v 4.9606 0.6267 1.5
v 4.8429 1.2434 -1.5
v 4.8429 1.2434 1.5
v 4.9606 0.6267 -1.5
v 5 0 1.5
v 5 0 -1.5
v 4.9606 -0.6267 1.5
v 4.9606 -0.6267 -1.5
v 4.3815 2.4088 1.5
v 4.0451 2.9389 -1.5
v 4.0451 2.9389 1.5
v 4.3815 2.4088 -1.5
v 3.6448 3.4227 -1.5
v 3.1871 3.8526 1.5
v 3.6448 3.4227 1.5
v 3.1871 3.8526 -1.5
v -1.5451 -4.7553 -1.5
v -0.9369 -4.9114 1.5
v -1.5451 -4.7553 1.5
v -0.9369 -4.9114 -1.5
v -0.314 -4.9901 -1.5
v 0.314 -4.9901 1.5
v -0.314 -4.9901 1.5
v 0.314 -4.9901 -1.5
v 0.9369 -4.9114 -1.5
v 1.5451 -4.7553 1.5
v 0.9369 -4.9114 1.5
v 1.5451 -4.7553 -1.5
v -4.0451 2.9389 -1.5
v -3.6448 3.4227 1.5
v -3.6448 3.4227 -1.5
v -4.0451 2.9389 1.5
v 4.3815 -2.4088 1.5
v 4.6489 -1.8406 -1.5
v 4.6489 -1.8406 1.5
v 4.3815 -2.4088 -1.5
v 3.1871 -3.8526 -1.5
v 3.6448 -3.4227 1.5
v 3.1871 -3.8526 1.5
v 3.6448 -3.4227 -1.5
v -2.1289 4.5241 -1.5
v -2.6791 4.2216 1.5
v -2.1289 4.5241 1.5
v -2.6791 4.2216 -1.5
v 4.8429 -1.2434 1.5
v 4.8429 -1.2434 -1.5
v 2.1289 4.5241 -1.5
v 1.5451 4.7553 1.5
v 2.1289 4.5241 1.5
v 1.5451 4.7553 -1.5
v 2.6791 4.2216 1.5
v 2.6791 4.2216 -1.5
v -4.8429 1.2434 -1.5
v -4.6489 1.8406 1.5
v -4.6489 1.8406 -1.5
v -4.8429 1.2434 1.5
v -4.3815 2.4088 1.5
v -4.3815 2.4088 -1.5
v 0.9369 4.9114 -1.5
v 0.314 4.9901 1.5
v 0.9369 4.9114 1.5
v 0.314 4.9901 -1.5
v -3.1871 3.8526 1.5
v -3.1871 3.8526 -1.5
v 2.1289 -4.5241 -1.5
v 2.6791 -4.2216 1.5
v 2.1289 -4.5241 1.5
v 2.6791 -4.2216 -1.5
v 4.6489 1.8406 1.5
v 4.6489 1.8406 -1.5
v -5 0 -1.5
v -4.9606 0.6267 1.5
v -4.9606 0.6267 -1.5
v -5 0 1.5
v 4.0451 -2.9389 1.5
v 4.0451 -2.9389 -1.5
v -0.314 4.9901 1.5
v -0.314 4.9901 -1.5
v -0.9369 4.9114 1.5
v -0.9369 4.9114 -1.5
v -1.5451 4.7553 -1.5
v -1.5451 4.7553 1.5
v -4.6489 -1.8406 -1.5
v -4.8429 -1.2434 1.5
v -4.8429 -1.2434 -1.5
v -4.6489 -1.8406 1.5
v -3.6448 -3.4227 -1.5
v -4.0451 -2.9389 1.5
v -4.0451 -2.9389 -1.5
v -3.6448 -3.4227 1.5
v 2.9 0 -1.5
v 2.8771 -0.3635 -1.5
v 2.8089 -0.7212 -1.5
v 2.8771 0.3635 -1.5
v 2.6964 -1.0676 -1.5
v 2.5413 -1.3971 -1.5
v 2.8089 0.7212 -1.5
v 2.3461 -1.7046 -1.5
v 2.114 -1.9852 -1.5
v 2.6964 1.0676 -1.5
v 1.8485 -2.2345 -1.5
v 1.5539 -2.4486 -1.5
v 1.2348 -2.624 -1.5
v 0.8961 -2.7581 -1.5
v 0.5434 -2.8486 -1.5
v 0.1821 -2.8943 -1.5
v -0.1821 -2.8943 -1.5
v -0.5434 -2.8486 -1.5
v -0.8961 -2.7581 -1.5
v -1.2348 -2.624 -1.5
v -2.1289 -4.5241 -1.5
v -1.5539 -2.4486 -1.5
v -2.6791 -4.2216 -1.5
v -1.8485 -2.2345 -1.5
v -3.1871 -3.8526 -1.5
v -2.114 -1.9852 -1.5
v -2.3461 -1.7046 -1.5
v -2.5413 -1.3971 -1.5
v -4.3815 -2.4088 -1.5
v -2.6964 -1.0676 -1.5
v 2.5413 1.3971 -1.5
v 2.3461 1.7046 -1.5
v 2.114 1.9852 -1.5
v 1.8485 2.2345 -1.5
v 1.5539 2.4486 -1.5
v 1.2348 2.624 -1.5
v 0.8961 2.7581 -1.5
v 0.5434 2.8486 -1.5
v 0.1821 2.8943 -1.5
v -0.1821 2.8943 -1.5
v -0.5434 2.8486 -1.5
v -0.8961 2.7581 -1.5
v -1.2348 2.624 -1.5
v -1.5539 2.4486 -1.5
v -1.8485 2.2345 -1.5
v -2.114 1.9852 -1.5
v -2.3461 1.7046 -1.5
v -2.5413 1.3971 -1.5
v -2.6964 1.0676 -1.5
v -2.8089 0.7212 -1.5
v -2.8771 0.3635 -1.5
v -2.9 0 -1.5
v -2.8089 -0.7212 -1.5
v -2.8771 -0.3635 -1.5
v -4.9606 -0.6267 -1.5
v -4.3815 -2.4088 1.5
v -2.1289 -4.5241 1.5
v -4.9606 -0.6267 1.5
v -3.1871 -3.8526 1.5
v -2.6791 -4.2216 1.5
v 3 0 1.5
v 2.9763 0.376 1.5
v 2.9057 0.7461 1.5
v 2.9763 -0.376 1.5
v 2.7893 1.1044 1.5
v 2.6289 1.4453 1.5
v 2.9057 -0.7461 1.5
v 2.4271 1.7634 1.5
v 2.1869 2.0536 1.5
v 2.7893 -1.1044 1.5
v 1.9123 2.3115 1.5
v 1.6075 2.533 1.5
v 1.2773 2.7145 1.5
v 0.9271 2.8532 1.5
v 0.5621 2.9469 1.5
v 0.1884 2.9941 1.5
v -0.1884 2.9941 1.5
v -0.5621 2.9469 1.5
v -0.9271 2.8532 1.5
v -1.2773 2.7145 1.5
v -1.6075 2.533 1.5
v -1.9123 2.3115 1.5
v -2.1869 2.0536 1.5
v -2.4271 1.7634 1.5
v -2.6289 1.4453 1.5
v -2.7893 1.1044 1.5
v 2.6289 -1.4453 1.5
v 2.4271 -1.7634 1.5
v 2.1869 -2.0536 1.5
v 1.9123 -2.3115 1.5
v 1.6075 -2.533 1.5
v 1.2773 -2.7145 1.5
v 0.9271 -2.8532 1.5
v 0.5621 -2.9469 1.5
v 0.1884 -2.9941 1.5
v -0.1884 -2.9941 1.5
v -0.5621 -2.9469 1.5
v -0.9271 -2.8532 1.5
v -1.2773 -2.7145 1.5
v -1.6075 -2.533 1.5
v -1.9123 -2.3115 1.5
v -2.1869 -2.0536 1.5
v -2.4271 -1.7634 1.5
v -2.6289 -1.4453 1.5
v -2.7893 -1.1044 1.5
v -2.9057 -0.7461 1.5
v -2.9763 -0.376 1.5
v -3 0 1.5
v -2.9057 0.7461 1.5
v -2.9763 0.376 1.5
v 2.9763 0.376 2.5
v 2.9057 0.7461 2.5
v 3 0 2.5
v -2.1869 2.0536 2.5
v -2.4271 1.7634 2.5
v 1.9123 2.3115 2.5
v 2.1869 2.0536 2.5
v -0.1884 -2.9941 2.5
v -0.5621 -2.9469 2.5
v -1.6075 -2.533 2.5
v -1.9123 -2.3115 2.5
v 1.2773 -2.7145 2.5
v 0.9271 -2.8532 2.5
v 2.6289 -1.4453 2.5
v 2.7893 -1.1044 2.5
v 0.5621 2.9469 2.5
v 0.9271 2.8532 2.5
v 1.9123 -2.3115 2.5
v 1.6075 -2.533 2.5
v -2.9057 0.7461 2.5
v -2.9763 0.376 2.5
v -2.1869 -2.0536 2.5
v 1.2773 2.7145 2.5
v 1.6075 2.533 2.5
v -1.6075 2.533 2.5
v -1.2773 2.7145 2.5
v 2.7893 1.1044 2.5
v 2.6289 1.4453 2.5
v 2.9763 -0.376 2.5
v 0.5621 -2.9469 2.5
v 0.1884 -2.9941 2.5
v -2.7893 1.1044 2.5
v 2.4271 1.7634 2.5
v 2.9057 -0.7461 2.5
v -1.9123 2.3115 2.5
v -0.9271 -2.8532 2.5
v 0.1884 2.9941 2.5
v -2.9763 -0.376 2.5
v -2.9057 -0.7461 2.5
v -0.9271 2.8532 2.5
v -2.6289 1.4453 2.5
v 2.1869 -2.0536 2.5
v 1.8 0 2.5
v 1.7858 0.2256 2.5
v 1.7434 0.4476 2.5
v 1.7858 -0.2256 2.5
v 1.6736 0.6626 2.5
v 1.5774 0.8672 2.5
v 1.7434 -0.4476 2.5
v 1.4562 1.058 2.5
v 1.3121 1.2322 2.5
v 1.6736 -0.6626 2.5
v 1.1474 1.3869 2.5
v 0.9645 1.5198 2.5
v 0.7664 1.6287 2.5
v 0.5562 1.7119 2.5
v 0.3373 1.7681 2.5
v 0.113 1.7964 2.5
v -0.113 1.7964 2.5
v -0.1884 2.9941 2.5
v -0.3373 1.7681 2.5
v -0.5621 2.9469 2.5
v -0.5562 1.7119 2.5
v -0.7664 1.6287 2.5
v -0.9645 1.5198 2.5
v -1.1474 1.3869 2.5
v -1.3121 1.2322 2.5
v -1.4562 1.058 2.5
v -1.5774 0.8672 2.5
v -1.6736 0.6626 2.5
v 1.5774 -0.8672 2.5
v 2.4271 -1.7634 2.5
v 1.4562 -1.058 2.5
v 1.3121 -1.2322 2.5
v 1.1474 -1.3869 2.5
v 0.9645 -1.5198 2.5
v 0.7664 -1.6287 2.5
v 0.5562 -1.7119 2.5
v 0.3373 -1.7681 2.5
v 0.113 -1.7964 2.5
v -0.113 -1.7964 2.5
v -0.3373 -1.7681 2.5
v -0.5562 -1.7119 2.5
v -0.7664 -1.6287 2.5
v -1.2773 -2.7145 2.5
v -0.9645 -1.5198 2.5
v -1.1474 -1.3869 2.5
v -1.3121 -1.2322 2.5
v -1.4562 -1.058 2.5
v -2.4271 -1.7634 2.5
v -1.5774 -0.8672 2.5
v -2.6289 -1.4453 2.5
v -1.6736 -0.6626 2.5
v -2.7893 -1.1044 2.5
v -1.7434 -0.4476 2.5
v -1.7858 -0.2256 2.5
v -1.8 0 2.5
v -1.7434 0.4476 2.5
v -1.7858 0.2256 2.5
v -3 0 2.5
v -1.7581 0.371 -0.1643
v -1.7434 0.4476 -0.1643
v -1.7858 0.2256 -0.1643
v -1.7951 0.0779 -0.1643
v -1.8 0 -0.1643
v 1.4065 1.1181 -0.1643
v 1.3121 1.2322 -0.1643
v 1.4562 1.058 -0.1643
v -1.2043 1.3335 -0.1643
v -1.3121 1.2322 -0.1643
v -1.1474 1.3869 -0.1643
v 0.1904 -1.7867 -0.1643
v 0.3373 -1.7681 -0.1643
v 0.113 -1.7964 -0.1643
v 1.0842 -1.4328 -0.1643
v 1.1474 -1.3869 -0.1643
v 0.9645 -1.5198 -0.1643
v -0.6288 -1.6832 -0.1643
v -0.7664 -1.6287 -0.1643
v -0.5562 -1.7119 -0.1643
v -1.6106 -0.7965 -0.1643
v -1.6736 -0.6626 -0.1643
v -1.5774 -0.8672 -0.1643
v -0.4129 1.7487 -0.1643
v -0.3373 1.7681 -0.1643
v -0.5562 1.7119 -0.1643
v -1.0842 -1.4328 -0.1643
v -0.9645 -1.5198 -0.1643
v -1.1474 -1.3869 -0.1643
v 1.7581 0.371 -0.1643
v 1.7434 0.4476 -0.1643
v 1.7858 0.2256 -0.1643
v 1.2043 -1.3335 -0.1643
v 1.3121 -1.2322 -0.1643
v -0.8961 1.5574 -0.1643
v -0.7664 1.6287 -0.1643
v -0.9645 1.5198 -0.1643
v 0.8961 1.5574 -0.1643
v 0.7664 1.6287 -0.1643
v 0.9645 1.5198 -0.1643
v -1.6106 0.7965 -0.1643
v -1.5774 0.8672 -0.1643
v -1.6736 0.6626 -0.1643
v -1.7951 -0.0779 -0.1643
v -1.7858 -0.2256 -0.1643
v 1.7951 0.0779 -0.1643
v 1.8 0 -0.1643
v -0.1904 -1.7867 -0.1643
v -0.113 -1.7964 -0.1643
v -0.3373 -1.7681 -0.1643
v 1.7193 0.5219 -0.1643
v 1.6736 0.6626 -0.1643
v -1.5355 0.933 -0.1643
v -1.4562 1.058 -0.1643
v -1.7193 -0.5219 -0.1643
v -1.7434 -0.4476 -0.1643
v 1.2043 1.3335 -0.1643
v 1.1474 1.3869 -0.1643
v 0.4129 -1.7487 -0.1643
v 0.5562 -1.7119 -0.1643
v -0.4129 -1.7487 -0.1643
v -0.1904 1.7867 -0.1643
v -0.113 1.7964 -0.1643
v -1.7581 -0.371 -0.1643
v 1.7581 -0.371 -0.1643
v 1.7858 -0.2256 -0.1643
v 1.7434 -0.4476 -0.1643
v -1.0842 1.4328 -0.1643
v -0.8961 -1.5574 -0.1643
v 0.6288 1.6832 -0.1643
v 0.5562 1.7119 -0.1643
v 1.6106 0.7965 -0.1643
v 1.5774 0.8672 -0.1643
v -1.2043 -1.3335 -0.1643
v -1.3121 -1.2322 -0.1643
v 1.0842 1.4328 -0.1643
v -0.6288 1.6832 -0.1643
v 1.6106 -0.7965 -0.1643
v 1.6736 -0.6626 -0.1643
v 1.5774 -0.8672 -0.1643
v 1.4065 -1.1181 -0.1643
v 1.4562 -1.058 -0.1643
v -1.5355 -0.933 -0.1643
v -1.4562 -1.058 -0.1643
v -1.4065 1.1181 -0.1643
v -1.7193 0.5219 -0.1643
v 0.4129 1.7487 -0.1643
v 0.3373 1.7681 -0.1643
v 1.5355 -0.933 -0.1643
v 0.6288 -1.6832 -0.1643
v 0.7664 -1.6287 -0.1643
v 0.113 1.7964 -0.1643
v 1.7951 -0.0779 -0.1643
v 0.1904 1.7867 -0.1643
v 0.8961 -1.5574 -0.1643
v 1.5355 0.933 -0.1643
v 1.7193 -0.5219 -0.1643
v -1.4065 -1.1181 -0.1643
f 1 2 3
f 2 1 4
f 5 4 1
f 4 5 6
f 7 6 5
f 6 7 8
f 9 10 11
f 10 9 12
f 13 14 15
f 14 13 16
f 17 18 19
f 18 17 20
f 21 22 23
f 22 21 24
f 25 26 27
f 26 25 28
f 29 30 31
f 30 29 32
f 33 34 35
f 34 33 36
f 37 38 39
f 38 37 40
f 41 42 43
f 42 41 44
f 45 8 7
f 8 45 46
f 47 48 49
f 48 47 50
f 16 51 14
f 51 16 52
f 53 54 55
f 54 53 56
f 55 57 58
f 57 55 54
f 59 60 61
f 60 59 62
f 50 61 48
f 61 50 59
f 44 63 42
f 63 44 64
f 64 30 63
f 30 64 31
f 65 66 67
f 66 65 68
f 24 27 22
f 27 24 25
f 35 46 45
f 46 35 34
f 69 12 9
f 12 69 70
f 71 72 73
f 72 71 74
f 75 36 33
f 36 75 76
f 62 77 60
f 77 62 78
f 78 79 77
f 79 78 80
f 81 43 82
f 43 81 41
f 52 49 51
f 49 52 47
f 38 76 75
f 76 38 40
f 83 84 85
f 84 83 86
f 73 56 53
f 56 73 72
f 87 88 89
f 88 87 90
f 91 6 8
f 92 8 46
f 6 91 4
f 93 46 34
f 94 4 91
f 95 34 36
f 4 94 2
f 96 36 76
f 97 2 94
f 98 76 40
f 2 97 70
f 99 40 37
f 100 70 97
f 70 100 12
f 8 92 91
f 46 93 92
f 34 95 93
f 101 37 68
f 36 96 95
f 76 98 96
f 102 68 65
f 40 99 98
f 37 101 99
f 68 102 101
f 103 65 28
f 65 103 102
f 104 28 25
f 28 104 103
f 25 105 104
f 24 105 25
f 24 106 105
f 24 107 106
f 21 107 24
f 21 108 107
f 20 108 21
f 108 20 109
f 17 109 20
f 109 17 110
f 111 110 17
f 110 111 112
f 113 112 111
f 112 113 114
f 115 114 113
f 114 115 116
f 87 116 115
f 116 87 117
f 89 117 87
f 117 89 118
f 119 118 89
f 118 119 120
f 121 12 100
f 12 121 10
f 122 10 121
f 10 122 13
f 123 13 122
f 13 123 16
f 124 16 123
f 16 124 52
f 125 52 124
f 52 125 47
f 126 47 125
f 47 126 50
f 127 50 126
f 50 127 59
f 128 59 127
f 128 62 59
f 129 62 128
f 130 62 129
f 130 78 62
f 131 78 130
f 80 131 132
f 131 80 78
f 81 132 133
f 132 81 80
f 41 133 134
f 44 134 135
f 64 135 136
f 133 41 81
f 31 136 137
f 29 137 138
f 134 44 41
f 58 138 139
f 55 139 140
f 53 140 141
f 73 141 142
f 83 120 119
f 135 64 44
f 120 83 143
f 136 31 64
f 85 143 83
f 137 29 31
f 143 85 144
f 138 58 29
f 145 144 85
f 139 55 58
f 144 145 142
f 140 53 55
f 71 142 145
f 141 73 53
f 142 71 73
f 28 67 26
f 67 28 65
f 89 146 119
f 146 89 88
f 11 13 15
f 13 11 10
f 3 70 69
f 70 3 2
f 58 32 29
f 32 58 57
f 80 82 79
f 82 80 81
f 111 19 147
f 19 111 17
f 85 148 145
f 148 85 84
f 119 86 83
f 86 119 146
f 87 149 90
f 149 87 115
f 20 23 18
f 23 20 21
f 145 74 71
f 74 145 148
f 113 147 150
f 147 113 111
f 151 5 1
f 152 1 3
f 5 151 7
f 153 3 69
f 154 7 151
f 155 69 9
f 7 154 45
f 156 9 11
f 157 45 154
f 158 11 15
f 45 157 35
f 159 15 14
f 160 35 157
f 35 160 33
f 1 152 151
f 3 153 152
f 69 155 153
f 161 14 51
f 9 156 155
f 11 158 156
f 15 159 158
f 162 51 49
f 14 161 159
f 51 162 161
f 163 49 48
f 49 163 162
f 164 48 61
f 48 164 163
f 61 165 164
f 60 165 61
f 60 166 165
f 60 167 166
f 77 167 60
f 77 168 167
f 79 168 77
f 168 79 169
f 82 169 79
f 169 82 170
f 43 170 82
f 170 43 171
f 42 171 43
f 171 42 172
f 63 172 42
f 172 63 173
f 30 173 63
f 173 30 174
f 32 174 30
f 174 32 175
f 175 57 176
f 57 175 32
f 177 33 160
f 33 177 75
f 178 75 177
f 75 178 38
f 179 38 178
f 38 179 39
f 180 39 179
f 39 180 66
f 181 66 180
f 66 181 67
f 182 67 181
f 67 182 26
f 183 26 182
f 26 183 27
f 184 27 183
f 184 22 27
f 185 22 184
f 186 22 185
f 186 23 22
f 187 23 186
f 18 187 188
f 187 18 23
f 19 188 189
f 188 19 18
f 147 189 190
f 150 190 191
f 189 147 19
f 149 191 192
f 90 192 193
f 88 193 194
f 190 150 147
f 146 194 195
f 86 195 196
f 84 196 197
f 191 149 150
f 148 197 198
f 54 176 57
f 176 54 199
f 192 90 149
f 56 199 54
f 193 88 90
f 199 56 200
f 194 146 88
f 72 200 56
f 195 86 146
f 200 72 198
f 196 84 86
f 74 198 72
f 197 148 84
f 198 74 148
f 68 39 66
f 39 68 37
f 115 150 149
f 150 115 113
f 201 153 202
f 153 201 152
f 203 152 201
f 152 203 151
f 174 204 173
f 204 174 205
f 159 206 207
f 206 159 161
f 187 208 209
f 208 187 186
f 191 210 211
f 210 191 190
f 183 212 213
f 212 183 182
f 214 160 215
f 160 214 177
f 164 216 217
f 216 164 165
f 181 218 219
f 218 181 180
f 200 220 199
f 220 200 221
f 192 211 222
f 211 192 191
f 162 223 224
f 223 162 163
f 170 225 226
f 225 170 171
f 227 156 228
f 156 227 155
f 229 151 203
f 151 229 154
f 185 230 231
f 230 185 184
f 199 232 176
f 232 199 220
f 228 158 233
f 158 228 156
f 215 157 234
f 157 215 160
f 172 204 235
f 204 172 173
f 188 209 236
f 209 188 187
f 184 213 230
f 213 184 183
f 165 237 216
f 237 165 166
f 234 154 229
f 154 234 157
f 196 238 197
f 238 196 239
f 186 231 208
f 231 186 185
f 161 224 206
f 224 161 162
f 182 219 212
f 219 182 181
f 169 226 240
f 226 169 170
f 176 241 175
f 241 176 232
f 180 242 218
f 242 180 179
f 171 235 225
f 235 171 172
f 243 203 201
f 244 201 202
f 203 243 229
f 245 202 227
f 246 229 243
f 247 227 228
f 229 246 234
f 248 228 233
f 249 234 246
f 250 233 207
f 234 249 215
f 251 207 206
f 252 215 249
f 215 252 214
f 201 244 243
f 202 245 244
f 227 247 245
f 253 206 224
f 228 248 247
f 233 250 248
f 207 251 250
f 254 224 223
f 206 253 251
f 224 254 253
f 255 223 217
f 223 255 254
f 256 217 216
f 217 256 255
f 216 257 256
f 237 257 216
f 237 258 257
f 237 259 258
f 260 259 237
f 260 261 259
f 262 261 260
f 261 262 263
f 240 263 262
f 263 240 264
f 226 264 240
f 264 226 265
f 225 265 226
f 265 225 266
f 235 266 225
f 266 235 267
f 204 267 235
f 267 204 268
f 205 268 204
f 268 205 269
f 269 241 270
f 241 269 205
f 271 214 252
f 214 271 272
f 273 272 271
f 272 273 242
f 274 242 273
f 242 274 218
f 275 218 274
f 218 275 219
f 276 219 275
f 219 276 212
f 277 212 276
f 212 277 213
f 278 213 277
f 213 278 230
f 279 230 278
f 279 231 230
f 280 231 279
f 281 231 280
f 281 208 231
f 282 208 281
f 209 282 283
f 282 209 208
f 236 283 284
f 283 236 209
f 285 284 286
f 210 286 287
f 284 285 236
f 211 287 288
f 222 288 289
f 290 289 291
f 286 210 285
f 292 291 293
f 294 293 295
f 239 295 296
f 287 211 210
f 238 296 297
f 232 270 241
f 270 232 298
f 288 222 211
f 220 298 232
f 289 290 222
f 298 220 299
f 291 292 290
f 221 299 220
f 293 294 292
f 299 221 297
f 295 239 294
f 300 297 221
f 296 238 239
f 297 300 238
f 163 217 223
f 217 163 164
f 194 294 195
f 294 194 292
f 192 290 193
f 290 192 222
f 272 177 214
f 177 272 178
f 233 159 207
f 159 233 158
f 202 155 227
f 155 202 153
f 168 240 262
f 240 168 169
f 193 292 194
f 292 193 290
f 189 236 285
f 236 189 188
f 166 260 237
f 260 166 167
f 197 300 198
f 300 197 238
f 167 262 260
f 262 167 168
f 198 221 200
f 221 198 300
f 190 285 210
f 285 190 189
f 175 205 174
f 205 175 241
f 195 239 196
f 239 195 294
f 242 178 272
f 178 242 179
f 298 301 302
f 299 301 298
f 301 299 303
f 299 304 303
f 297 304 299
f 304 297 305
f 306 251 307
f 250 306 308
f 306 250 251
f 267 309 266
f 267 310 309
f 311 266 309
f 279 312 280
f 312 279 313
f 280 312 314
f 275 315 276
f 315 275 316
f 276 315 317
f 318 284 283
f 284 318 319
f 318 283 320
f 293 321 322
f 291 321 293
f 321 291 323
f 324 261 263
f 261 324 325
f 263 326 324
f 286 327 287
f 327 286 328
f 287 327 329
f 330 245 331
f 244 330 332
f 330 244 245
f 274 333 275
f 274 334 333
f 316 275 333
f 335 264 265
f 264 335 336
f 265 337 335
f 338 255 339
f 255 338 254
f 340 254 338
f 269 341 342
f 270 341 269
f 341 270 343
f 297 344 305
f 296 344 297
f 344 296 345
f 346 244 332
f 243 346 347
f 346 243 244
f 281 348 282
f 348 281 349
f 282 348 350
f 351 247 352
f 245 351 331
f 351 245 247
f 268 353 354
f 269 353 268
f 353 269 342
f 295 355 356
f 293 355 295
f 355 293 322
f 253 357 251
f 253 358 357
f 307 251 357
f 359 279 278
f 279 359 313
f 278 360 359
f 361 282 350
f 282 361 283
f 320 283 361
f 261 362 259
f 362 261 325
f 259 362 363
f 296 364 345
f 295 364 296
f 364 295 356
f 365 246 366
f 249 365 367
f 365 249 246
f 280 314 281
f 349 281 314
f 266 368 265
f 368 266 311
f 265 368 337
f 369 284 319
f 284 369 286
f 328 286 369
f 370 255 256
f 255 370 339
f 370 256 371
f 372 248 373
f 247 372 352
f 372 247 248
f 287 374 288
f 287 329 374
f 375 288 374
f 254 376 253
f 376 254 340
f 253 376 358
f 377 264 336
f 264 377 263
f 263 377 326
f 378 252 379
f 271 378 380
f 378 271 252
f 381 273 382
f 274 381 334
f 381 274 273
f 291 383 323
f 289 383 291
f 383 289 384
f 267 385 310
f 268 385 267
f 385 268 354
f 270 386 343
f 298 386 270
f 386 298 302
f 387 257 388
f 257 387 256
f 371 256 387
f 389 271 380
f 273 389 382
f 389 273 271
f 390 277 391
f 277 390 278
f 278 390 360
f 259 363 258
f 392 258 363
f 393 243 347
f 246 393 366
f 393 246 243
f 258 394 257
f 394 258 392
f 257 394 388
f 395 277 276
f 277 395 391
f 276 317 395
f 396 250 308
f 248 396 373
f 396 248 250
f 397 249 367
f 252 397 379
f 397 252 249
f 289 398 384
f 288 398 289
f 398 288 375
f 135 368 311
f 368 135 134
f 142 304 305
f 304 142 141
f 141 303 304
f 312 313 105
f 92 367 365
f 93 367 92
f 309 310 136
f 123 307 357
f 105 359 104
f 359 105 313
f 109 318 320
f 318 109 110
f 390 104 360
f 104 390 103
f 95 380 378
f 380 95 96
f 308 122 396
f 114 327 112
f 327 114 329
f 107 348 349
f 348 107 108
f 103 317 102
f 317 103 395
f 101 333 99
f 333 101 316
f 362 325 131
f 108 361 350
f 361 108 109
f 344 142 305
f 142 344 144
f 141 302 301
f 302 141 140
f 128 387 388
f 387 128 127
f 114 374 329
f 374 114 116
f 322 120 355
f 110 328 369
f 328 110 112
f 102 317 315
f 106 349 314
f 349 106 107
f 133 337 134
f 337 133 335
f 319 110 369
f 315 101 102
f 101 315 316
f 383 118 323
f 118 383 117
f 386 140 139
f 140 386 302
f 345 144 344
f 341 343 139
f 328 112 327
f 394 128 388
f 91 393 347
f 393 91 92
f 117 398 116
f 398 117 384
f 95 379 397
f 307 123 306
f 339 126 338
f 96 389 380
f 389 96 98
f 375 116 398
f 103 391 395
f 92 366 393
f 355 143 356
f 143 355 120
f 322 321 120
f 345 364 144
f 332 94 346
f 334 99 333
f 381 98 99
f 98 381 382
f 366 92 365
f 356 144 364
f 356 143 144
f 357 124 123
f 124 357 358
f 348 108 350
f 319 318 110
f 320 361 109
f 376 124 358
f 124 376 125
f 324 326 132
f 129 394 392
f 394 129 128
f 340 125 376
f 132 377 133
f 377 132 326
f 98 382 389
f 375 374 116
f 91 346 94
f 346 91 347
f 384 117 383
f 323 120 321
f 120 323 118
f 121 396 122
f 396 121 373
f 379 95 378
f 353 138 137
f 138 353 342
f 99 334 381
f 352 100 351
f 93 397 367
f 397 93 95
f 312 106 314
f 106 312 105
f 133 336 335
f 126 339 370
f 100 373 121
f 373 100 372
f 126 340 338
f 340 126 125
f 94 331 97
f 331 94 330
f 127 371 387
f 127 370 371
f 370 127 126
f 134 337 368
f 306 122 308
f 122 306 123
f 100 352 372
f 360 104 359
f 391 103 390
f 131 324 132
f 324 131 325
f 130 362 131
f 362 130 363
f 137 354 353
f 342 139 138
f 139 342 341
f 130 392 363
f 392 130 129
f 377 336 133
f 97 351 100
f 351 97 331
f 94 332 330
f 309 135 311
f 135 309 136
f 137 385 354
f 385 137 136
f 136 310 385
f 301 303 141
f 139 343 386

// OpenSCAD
$fn = 50;


difference() {
	union() {
		translate(v = [0, 0, -1.5000000000]) {
			cylinder(h = 3, r = 5.0000000000);
		}
		translate(v = [0, 0, -1.5000000000]) {
			cylinder(h = 4, r = 3.0000000000);
		}
	}
	union() {
		translate(v = [0, 0, -1.5000000000]) {
			rotate(a = [0, 180, 0]) {
				difference() {
					union() {
						translate(v = [0, 0, -4.0000000000]) {
							cylinder(h = 4, r = 1.5000000000);
						}
						translate(v = [0, 0, -4.0000000000]) {
							cylinder(h = 4, r = 1.8000000000);
						}
						translate(v = [0, 0, -1.7000000000]) {
							cylinder(h = 1.7000000000, r1 = 1.5000000000, r2 = 2.9000000000);
						}
						translate(v = [0, 0, -4.0000000000]) {
							cylinder(h = 4, r = 1.5000000000);
						}
					}
					union();
				}
			}
		}
		translate(v = [0, 0, -100.0000000000]) {
			cylinder(h = 200, r = 1.5000000000);
		}
	}
}
